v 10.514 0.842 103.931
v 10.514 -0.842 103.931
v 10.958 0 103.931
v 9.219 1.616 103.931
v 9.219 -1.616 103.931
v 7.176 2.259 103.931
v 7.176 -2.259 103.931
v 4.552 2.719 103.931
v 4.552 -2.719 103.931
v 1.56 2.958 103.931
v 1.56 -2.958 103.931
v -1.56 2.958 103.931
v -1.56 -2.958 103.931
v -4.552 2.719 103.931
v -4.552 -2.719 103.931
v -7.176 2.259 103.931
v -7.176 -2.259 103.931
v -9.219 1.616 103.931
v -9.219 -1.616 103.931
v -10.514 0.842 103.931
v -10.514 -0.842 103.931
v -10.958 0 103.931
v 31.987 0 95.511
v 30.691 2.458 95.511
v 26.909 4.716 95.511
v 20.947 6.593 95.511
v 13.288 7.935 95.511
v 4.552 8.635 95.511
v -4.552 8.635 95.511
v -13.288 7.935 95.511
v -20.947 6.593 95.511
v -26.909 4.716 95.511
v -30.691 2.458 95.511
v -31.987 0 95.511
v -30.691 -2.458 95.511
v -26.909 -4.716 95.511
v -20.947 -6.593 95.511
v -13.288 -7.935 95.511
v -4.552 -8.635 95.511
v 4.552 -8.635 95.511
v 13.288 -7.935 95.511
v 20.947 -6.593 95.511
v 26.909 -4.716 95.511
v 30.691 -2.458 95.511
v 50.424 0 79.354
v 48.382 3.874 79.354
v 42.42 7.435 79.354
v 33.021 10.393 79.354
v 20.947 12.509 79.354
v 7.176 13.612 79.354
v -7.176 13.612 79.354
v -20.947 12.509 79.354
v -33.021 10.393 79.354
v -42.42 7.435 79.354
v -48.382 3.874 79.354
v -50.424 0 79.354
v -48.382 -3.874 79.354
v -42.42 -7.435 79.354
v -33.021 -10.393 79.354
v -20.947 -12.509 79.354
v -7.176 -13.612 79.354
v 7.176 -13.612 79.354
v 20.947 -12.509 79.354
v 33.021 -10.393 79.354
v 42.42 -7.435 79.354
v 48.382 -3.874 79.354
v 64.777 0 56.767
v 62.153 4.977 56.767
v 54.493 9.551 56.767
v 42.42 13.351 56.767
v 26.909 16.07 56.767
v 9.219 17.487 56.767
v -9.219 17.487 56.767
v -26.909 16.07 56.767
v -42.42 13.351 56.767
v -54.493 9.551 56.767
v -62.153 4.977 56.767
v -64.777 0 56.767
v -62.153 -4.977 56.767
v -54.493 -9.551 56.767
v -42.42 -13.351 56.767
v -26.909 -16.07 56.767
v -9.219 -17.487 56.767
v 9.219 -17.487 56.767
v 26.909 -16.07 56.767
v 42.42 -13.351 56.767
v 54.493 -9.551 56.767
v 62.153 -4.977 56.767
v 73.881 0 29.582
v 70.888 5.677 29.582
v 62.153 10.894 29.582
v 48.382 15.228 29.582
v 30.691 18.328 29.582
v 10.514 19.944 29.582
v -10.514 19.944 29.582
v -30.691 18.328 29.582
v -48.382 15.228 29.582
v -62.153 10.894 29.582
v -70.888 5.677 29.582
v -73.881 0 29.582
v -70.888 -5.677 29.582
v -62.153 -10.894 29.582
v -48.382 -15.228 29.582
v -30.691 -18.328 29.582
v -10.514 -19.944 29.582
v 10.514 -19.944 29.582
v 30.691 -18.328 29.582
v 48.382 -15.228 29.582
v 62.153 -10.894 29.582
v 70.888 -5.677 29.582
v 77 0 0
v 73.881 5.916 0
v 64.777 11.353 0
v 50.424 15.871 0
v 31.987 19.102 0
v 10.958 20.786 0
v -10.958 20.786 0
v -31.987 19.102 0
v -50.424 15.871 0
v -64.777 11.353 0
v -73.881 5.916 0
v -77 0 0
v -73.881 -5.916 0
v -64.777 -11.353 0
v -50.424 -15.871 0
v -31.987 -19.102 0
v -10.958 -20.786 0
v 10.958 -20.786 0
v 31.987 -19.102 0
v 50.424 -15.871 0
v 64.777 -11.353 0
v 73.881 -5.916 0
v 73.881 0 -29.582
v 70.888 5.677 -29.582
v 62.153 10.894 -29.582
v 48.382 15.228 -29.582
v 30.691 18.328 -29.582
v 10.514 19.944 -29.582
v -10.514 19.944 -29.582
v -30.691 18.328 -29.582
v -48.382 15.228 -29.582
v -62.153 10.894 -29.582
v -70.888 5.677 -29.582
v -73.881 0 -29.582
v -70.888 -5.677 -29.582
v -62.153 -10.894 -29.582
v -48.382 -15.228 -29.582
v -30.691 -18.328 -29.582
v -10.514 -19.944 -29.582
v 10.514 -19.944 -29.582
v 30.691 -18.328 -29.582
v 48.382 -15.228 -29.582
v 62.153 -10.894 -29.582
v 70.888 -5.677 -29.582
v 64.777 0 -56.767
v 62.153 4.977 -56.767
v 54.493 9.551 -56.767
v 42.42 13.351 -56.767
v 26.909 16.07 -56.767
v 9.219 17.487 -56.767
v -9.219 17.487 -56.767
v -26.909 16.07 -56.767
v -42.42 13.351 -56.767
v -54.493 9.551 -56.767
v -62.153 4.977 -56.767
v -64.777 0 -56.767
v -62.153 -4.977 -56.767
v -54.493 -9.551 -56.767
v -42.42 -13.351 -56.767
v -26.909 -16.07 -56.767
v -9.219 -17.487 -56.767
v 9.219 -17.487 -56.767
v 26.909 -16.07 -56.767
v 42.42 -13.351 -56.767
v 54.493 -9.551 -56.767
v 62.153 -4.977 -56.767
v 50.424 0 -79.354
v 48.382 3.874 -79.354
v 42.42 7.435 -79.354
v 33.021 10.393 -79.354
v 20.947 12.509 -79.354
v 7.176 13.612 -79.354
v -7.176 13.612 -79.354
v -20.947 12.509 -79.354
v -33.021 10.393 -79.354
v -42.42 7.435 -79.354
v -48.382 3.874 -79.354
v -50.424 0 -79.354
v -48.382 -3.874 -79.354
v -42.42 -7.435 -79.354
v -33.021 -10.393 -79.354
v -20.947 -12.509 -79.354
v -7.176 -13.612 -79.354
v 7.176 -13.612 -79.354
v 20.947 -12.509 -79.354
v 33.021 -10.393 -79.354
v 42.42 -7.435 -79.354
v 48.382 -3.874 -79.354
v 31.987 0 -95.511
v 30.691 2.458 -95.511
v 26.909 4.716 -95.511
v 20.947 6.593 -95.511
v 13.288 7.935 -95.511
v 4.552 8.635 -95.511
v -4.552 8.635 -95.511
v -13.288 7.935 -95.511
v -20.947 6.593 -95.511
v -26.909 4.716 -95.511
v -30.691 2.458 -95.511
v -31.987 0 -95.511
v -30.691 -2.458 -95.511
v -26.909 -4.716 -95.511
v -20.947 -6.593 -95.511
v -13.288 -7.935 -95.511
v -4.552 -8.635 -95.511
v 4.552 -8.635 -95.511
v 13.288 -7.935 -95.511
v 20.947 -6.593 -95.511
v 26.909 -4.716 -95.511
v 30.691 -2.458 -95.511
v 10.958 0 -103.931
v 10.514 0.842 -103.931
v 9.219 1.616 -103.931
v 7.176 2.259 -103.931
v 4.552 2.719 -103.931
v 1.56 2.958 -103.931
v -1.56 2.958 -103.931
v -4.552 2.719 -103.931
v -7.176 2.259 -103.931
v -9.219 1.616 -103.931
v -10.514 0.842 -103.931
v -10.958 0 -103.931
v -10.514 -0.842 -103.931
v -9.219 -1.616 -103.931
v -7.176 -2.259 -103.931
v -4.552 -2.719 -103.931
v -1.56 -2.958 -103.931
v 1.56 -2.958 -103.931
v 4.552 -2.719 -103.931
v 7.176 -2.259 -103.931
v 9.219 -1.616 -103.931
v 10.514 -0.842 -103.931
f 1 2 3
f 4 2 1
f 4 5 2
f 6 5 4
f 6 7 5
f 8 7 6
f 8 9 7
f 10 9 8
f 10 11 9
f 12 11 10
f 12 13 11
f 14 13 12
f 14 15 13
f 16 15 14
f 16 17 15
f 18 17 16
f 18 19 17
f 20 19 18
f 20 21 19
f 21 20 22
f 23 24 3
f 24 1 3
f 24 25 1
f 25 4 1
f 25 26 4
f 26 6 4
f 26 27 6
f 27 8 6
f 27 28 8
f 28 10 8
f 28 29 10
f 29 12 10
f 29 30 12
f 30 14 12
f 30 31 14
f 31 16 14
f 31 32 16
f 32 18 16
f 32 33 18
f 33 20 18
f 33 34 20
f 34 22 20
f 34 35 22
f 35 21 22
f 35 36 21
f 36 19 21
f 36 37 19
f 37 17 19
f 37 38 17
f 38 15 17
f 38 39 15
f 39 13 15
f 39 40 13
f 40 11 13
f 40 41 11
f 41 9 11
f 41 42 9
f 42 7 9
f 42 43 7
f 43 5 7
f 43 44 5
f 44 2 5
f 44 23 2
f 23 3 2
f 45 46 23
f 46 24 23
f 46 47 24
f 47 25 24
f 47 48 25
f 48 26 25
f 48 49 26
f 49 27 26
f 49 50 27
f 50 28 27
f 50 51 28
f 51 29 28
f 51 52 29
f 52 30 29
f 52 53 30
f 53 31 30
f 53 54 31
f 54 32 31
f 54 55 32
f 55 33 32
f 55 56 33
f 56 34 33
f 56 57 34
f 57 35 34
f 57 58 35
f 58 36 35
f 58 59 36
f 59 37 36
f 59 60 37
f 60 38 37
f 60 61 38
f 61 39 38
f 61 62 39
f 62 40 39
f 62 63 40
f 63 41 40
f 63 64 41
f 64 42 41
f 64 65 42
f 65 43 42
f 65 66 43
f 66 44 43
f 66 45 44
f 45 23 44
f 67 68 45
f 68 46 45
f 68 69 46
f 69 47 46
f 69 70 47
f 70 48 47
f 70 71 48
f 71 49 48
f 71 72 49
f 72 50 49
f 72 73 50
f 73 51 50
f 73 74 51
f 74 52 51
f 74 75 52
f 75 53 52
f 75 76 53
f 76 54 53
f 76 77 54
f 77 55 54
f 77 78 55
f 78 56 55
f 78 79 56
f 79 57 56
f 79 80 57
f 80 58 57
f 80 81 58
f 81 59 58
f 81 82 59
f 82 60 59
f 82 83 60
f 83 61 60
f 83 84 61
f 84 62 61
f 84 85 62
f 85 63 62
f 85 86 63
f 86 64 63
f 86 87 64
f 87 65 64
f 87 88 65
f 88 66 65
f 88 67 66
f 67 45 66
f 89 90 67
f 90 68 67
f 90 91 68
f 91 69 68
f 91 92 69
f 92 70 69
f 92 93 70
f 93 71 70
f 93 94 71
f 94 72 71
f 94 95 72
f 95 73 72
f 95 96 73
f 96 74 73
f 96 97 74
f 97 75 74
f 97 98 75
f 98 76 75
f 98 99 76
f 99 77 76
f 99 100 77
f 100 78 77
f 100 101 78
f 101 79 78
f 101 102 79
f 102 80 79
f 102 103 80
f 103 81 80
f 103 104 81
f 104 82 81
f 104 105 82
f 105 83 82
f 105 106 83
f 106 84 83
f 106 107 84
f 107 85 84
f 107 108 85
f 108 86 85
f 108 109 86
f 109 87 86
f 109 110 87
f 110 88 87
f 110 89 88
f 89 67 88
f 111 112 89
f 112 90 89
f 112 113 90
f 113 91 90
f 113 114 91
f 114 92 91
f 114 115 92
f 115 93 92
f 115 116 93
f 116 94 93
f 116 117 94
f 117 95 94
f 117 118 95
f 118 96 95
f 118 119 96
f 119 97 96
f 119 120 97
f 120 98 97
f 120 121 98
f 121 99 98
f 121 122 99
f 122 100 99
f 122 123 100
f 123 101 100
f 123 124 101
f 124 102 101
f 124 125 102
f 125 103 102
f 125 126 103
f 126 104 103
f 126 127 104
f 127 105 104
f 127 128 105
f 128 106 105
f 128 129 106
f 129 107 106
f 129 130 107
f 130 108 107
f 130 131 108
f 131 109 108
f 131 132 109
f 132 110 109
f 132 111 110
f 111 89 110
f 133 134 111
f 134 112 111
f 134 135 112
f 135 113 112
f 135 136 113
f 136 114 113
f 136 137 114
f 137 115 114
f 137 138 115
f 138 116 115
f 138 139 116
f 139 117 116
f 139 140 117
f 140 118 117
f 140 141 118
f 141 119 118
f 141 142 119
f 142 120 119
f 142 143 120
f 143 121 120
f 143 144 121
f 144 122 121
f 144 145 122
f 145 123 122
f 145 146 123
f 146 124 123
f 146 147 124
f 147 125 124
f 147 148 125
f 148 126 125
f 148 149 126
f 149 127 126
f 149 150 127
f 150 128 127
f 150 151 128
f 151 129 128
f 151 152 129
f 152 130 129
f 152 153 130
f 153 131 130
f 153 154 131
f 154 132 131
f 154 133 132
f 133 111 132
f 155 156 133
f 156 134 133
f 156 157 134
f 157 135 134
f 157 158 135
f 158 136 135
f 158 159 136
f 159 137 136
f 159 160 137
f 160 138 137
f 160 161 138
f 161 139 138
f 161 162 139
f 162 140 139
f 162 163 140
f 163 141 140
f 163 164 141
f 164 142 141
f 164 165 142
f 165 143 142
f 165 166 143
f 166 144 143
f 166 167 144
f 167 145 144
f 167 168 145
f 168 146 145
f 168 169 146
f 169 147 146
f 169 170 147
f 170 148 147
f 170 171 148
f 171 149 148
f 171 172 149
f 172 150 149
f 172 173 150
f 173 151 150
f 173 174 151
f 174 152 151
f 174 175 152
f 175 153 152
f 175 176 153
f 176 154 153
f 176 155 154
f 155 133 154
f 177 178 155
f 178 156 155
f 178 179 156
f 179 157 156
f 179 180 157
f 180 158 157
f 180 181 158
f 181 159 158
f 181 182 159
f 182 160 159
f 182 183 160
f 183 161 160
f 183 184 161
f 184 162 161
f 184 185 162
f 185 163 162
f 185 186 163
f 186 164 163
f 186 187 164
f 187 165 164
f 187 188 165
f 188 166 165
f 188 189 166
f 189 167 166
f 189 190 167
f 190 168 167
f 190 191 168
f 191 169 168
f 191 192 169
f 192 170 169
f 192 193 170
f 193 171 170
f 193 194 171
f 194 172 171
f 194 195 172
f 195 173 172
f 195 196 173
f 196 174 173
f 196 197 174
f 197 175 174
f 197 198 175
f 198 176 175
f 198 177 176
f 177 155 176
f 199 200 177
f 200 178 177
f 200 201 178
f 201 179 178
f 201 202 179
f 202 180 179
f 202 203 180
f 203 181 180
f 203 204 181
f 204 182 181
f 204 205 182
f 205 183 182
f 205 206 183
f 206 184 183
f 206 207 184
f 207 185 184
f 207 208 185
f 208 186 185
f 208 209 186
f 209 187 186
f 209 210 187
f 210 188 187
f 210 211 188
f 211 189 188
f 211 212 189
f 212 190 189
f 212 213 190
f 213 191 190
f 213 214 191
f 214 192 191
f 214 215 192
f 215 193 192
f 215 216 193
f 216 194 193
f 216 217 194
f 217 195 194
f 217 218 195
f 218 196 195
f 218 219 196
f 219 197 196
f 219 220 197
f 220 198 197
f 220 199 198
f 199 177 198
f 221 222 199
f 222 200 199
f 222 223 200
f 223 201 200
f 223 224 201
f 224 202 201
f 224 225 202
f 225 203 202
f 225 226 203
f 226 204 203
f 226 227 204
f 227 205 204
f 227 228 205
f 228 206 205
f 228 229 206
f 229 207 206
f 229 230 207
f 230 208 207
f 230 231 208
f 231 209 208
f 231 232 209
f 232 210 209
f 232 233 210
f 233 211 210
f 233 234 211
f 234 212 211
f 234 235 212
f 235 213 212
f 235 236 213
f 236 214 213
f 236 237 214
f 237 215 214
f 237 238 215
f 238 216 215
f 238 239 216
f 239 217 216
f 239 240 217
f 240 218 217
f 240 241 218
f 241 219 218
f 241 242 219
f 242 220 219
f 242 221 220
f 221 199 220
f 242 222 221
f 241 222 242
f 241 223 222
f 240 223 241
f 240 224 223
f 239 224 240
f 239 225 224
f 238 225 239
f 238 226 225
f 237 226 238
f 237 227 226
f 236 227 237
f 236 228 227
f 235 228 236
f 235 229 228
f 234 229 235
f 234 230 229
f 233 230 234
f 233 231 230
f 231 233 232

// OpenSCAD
// Generated by SolidPython 1.0.1 on 2020-07-29 00:46:49


scale(v = [11, 3, 15]) {
	sphere(r = 7);
}
/***********************************************
*********      SolidPython code:      **********
************************************************
 
# import packages: SolidPython
from solid import *
from solid.utils import *
from itertools import chain, combinations, permutations


class Resize:

    def __init__(self, scad_file):
        self.scad_file = scad_file
        #self.scad_file = import_scad(scad_file)
        # cone/cylinder param:
        self.r1 = 0
        self.r2 = 0
        self.h = 0
        # rectangular prism param:
        self.w = 0
        self.l = 0
        # ellipse param:
        self.r = 0

    # import OpenScad code (file name corresponds to shape)


    # classify shape + parameters
    def assign(self, param1, param2, param3):
        if self.scad_file == 'cone.scad':
            self.r1 = param1
            self.r2 = param2
            self.h = param3
        elif self.scad_file == 'cylinder.scad':
            self.r1 = param1
            self.r2 = param2
            self.h = param3
        elif self.scad_file == 'rectangularPrism.scad':
            self.h = param1
            self.l = param2
            self.w = param3
        else:
            self.r = param1
            self.h = param2

    # resize parameters
    def iterate(self):
        x = range(3, 20, 2)
        i = 1
        if self.scad_file == 'cone.scad':
            tempList = list(permutations(x, 2))
            for temp in tempList:
                param1 = temp[0]
                param2 = temp[1]
                filepath = 'produced_scad_files/' + 'cone' + str(param1) + '_' + str(param2) + '_' + '.scad'
                scad_render_to_file(cylinder(h=param1, r1=param2, r2=0), filepath)

        elif self.scad_file == 'cylinder.scad':
            tempList = list(permutations(x, 3))
            for temp in tempList:
                param1 = temp[0]
                param2 = temp[1]
                filepath = 'produced_scad_files/' + 'cylinder' + str(param1) + '_' + str(param2) + '_' + '.scad'
                scad_render_to_file(cylinder(h=param1, r1=param2, r2=param2), filepath)

        elif self.scad_file == 'rectangularPrism.scad':
            tempList = list(permutations(x, 3))
            for temp in tempList:
                param1 = temp[0]
                param2 = temp[1]
                param3 = temp[2]
                filepath = 'produced_scad_files/' + 'rectangularPrism' + str(param1) + '_' + str(param2) + '_' + str(
                    param3) + '.scad'
                scad_render_to_file(cube(size=(param1, param2, param3)), filepath)

        elif self.scad_file == 'ellipse.scad':
            tempList = list(permutations(x, 4))
            for temp in tempList:
                param1 = temp[0]
                param2 = temp[1]
                param3 = temp[2]
                param4 = temp[3]
                filepath = 'produced_scad_files/' + 'ellipse' + str(param1) + '_' + str(param2) + '_' + str(param3) + '_' + str(param4) + '.scad'
                scad_render_to_file(scale([param1, param2, param3])(sphere(r=param4)), filepath)

    def render_to_scadfile(self):
        scad_render_to_file(scad, 'example.scad') 
 
************************************************/
